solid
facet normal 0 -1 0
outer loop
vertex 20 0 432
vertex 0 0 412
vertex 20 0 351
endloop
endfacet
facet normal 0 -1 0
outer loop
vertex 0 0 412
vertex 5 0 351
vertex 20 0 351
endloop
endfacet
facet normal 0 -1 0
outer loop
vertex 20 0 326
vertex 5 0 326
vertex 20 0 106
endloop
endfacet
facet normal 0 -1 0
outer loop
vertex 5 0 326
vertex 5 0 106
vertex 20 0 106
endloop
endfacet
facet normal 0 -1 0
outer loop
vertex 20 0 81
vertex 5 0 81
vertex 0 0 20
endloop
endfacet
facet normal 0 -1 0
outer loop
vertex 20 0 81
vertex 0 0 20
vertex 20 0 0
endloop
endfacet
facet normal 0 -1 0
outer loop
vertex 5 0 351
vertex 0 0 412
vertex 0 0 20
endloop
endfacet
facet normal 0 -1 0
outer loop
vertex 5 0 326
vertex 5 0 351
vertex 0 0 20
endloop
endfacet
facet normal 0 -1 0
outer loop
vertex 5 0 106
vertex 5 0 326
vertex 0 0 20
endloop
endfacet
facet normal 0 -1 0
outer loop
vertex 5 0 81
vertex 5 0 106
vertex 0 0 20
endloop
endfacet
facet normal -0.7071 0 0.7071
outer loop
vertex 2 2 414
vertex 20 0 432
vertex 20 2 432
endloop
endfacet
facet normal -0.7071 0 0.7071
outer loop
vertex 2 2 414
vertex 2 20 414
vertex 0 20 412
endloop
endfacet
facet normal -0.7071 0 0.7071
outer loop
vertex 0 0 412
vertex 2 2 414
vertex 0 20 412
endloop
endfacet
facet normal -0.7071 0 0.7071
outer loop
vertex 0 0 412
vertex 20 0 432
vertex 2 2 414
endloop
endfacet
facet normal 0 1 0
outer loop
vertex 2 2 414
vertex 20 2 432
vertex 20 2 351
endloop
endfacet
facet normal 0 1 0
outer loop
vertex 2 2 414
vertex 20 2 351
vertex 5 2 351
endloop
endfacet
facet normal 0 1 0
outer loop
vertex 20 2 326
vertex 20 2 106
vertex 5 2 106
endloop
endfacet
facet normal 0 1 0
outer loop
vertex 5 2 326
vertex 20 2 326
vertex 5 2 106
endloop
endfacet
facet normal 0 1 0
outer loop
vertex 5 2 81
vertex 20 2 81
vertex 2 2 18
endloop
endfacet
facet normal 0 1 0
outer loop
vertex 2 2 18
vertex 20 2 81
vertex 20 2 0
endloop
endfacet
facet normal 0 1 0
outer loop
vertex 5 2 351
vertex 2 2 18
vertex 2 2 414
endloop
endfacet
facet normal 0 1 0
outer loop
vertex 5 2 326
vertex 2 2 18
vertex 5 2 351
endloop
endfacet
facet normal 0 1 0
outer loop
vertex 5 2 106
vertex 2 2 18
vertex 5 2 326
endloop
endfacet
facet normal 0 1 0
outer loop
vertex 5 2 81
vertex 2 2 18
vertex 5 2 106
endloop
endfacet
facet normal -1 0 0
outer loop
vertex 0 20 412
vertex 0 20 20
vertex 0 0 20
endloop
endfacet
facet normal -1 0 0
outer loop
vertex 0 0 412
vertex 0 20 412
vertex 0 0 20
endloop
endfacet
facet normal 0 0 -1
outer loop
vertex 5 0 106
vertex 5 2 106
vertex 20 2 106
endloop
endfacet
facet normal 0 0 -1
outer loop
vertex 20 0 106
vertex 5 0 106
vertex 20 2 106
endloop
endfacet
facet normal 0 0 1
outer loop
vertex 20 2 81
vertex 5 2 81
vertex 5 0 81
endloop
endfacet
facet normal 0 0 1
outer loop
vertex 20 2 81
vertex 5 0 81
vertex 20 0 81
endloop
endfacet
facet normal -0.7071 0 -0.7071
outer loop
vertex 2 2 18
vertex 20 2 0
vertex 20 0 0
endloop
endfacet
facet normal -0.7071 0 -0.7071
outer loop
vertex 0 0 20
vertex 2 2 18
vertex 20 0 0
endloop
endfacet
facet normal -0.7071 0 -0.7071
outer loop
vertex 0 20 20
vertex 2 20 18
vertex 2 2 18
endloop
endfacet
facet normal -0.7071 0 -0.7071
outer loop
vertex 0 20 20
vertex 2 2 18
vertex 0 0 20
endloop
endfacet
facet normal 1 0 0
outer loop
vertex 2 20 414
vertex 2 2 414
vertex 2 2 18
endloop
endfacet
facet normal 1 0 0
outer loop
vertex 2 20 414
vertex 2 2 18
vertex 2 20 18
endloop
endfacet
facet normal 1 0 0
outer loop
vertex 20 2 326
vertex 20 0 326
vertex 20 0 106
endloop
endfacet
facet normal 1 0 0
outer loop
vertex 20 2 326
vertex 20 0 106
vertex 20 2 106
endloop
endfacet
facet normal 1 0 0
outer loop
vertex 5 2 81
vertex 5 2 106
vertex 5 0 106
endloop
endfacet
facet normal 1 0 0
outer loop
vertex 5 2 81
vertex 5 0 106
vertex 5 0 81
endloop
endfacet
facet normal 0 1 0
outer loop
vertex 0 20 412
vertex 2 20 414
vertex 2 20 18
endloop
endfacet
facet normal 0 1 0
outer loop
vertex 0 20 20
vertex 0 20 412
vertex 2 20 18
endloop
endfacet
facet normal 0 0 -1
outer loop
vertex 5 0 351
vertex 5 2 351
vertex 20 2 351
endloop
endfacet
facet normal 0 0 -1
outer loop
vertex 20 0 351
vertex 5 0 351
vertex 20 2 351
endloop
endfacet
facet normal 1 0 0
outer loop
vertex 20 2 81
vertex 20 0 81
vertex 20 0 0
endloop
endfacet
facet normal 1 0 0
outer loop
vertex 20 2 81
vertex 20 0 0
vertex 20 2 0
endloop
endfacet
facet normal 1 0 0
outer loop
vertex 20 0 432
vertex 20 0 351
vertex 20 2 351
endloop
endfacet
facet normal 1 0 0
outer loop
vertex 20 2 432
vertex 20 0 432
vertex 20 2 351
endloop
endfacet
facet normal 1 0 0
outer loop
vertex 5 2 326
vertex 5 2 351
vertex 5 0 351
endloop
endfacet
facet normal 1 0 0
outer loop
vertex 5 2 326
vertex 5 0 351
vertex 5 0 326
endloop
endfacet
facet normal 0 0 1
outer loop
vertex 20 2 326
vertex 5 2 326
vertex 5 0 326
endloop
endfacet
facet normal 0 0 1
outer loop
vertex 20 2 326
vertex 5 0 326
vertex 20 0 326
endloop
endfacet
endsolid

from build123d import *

# Parameters (mm, degrees)
BOSS_EXTRUDE1_DEPTH = 432
CUT_EXTRUDE1_DEPTH  = 23
SKETCH3_W           = 15
SKETCH3_H           = 25
CUT_EXTRUDE2_DEPTH  = 3


with BuildPart() as part:
    # Sketch1 → Boss-Extrude1 (new body)
    with BuildSketch(Plane.XY):
        Polygon((0, 0), (20, 0), (20, 2), (2, 2), (2, 20), (0, 20), align=None)
    extrude(amount=BOSS_EXTRUDE1_DEPTH)

    # Sketch2 → Cut-Extrude1 (cut, symmetric)
    with BuildSketch(Plane(origin=(0, 2, 0), x_dir=(1, 0, 0), z_dir=(0, 1, 0))):
        Polygon((0, -432), (20, -432), (0, -412), align=None)
        Polygon((20, 0), (0, -20), (0, 0), align=None)
    extrude(amount=CUT_EXTRUDE1_DEPTH, both=True, mode=Mode.SUBTRACT)

    # Sketch3 → Cut-Extrude2 (cut, through all)
    with BuildSketch(Plane(origin=(0, 2, 0), x_dir=(1, 0, 0), z_dir=(0, 1, 0))):
        with Locations((12.5, -93.5)):
            Rectangle(SKETCH3_W, SKETCH3_H)
        with Locations((12.5, -338.5)):
            Rectangle(SKETCH3_W, SKETCH3_H)
    extrude(amount=-CUT_EXTRUDE2_DEPTH, mode=Mode.SUBTRACT)


solid = part.part
